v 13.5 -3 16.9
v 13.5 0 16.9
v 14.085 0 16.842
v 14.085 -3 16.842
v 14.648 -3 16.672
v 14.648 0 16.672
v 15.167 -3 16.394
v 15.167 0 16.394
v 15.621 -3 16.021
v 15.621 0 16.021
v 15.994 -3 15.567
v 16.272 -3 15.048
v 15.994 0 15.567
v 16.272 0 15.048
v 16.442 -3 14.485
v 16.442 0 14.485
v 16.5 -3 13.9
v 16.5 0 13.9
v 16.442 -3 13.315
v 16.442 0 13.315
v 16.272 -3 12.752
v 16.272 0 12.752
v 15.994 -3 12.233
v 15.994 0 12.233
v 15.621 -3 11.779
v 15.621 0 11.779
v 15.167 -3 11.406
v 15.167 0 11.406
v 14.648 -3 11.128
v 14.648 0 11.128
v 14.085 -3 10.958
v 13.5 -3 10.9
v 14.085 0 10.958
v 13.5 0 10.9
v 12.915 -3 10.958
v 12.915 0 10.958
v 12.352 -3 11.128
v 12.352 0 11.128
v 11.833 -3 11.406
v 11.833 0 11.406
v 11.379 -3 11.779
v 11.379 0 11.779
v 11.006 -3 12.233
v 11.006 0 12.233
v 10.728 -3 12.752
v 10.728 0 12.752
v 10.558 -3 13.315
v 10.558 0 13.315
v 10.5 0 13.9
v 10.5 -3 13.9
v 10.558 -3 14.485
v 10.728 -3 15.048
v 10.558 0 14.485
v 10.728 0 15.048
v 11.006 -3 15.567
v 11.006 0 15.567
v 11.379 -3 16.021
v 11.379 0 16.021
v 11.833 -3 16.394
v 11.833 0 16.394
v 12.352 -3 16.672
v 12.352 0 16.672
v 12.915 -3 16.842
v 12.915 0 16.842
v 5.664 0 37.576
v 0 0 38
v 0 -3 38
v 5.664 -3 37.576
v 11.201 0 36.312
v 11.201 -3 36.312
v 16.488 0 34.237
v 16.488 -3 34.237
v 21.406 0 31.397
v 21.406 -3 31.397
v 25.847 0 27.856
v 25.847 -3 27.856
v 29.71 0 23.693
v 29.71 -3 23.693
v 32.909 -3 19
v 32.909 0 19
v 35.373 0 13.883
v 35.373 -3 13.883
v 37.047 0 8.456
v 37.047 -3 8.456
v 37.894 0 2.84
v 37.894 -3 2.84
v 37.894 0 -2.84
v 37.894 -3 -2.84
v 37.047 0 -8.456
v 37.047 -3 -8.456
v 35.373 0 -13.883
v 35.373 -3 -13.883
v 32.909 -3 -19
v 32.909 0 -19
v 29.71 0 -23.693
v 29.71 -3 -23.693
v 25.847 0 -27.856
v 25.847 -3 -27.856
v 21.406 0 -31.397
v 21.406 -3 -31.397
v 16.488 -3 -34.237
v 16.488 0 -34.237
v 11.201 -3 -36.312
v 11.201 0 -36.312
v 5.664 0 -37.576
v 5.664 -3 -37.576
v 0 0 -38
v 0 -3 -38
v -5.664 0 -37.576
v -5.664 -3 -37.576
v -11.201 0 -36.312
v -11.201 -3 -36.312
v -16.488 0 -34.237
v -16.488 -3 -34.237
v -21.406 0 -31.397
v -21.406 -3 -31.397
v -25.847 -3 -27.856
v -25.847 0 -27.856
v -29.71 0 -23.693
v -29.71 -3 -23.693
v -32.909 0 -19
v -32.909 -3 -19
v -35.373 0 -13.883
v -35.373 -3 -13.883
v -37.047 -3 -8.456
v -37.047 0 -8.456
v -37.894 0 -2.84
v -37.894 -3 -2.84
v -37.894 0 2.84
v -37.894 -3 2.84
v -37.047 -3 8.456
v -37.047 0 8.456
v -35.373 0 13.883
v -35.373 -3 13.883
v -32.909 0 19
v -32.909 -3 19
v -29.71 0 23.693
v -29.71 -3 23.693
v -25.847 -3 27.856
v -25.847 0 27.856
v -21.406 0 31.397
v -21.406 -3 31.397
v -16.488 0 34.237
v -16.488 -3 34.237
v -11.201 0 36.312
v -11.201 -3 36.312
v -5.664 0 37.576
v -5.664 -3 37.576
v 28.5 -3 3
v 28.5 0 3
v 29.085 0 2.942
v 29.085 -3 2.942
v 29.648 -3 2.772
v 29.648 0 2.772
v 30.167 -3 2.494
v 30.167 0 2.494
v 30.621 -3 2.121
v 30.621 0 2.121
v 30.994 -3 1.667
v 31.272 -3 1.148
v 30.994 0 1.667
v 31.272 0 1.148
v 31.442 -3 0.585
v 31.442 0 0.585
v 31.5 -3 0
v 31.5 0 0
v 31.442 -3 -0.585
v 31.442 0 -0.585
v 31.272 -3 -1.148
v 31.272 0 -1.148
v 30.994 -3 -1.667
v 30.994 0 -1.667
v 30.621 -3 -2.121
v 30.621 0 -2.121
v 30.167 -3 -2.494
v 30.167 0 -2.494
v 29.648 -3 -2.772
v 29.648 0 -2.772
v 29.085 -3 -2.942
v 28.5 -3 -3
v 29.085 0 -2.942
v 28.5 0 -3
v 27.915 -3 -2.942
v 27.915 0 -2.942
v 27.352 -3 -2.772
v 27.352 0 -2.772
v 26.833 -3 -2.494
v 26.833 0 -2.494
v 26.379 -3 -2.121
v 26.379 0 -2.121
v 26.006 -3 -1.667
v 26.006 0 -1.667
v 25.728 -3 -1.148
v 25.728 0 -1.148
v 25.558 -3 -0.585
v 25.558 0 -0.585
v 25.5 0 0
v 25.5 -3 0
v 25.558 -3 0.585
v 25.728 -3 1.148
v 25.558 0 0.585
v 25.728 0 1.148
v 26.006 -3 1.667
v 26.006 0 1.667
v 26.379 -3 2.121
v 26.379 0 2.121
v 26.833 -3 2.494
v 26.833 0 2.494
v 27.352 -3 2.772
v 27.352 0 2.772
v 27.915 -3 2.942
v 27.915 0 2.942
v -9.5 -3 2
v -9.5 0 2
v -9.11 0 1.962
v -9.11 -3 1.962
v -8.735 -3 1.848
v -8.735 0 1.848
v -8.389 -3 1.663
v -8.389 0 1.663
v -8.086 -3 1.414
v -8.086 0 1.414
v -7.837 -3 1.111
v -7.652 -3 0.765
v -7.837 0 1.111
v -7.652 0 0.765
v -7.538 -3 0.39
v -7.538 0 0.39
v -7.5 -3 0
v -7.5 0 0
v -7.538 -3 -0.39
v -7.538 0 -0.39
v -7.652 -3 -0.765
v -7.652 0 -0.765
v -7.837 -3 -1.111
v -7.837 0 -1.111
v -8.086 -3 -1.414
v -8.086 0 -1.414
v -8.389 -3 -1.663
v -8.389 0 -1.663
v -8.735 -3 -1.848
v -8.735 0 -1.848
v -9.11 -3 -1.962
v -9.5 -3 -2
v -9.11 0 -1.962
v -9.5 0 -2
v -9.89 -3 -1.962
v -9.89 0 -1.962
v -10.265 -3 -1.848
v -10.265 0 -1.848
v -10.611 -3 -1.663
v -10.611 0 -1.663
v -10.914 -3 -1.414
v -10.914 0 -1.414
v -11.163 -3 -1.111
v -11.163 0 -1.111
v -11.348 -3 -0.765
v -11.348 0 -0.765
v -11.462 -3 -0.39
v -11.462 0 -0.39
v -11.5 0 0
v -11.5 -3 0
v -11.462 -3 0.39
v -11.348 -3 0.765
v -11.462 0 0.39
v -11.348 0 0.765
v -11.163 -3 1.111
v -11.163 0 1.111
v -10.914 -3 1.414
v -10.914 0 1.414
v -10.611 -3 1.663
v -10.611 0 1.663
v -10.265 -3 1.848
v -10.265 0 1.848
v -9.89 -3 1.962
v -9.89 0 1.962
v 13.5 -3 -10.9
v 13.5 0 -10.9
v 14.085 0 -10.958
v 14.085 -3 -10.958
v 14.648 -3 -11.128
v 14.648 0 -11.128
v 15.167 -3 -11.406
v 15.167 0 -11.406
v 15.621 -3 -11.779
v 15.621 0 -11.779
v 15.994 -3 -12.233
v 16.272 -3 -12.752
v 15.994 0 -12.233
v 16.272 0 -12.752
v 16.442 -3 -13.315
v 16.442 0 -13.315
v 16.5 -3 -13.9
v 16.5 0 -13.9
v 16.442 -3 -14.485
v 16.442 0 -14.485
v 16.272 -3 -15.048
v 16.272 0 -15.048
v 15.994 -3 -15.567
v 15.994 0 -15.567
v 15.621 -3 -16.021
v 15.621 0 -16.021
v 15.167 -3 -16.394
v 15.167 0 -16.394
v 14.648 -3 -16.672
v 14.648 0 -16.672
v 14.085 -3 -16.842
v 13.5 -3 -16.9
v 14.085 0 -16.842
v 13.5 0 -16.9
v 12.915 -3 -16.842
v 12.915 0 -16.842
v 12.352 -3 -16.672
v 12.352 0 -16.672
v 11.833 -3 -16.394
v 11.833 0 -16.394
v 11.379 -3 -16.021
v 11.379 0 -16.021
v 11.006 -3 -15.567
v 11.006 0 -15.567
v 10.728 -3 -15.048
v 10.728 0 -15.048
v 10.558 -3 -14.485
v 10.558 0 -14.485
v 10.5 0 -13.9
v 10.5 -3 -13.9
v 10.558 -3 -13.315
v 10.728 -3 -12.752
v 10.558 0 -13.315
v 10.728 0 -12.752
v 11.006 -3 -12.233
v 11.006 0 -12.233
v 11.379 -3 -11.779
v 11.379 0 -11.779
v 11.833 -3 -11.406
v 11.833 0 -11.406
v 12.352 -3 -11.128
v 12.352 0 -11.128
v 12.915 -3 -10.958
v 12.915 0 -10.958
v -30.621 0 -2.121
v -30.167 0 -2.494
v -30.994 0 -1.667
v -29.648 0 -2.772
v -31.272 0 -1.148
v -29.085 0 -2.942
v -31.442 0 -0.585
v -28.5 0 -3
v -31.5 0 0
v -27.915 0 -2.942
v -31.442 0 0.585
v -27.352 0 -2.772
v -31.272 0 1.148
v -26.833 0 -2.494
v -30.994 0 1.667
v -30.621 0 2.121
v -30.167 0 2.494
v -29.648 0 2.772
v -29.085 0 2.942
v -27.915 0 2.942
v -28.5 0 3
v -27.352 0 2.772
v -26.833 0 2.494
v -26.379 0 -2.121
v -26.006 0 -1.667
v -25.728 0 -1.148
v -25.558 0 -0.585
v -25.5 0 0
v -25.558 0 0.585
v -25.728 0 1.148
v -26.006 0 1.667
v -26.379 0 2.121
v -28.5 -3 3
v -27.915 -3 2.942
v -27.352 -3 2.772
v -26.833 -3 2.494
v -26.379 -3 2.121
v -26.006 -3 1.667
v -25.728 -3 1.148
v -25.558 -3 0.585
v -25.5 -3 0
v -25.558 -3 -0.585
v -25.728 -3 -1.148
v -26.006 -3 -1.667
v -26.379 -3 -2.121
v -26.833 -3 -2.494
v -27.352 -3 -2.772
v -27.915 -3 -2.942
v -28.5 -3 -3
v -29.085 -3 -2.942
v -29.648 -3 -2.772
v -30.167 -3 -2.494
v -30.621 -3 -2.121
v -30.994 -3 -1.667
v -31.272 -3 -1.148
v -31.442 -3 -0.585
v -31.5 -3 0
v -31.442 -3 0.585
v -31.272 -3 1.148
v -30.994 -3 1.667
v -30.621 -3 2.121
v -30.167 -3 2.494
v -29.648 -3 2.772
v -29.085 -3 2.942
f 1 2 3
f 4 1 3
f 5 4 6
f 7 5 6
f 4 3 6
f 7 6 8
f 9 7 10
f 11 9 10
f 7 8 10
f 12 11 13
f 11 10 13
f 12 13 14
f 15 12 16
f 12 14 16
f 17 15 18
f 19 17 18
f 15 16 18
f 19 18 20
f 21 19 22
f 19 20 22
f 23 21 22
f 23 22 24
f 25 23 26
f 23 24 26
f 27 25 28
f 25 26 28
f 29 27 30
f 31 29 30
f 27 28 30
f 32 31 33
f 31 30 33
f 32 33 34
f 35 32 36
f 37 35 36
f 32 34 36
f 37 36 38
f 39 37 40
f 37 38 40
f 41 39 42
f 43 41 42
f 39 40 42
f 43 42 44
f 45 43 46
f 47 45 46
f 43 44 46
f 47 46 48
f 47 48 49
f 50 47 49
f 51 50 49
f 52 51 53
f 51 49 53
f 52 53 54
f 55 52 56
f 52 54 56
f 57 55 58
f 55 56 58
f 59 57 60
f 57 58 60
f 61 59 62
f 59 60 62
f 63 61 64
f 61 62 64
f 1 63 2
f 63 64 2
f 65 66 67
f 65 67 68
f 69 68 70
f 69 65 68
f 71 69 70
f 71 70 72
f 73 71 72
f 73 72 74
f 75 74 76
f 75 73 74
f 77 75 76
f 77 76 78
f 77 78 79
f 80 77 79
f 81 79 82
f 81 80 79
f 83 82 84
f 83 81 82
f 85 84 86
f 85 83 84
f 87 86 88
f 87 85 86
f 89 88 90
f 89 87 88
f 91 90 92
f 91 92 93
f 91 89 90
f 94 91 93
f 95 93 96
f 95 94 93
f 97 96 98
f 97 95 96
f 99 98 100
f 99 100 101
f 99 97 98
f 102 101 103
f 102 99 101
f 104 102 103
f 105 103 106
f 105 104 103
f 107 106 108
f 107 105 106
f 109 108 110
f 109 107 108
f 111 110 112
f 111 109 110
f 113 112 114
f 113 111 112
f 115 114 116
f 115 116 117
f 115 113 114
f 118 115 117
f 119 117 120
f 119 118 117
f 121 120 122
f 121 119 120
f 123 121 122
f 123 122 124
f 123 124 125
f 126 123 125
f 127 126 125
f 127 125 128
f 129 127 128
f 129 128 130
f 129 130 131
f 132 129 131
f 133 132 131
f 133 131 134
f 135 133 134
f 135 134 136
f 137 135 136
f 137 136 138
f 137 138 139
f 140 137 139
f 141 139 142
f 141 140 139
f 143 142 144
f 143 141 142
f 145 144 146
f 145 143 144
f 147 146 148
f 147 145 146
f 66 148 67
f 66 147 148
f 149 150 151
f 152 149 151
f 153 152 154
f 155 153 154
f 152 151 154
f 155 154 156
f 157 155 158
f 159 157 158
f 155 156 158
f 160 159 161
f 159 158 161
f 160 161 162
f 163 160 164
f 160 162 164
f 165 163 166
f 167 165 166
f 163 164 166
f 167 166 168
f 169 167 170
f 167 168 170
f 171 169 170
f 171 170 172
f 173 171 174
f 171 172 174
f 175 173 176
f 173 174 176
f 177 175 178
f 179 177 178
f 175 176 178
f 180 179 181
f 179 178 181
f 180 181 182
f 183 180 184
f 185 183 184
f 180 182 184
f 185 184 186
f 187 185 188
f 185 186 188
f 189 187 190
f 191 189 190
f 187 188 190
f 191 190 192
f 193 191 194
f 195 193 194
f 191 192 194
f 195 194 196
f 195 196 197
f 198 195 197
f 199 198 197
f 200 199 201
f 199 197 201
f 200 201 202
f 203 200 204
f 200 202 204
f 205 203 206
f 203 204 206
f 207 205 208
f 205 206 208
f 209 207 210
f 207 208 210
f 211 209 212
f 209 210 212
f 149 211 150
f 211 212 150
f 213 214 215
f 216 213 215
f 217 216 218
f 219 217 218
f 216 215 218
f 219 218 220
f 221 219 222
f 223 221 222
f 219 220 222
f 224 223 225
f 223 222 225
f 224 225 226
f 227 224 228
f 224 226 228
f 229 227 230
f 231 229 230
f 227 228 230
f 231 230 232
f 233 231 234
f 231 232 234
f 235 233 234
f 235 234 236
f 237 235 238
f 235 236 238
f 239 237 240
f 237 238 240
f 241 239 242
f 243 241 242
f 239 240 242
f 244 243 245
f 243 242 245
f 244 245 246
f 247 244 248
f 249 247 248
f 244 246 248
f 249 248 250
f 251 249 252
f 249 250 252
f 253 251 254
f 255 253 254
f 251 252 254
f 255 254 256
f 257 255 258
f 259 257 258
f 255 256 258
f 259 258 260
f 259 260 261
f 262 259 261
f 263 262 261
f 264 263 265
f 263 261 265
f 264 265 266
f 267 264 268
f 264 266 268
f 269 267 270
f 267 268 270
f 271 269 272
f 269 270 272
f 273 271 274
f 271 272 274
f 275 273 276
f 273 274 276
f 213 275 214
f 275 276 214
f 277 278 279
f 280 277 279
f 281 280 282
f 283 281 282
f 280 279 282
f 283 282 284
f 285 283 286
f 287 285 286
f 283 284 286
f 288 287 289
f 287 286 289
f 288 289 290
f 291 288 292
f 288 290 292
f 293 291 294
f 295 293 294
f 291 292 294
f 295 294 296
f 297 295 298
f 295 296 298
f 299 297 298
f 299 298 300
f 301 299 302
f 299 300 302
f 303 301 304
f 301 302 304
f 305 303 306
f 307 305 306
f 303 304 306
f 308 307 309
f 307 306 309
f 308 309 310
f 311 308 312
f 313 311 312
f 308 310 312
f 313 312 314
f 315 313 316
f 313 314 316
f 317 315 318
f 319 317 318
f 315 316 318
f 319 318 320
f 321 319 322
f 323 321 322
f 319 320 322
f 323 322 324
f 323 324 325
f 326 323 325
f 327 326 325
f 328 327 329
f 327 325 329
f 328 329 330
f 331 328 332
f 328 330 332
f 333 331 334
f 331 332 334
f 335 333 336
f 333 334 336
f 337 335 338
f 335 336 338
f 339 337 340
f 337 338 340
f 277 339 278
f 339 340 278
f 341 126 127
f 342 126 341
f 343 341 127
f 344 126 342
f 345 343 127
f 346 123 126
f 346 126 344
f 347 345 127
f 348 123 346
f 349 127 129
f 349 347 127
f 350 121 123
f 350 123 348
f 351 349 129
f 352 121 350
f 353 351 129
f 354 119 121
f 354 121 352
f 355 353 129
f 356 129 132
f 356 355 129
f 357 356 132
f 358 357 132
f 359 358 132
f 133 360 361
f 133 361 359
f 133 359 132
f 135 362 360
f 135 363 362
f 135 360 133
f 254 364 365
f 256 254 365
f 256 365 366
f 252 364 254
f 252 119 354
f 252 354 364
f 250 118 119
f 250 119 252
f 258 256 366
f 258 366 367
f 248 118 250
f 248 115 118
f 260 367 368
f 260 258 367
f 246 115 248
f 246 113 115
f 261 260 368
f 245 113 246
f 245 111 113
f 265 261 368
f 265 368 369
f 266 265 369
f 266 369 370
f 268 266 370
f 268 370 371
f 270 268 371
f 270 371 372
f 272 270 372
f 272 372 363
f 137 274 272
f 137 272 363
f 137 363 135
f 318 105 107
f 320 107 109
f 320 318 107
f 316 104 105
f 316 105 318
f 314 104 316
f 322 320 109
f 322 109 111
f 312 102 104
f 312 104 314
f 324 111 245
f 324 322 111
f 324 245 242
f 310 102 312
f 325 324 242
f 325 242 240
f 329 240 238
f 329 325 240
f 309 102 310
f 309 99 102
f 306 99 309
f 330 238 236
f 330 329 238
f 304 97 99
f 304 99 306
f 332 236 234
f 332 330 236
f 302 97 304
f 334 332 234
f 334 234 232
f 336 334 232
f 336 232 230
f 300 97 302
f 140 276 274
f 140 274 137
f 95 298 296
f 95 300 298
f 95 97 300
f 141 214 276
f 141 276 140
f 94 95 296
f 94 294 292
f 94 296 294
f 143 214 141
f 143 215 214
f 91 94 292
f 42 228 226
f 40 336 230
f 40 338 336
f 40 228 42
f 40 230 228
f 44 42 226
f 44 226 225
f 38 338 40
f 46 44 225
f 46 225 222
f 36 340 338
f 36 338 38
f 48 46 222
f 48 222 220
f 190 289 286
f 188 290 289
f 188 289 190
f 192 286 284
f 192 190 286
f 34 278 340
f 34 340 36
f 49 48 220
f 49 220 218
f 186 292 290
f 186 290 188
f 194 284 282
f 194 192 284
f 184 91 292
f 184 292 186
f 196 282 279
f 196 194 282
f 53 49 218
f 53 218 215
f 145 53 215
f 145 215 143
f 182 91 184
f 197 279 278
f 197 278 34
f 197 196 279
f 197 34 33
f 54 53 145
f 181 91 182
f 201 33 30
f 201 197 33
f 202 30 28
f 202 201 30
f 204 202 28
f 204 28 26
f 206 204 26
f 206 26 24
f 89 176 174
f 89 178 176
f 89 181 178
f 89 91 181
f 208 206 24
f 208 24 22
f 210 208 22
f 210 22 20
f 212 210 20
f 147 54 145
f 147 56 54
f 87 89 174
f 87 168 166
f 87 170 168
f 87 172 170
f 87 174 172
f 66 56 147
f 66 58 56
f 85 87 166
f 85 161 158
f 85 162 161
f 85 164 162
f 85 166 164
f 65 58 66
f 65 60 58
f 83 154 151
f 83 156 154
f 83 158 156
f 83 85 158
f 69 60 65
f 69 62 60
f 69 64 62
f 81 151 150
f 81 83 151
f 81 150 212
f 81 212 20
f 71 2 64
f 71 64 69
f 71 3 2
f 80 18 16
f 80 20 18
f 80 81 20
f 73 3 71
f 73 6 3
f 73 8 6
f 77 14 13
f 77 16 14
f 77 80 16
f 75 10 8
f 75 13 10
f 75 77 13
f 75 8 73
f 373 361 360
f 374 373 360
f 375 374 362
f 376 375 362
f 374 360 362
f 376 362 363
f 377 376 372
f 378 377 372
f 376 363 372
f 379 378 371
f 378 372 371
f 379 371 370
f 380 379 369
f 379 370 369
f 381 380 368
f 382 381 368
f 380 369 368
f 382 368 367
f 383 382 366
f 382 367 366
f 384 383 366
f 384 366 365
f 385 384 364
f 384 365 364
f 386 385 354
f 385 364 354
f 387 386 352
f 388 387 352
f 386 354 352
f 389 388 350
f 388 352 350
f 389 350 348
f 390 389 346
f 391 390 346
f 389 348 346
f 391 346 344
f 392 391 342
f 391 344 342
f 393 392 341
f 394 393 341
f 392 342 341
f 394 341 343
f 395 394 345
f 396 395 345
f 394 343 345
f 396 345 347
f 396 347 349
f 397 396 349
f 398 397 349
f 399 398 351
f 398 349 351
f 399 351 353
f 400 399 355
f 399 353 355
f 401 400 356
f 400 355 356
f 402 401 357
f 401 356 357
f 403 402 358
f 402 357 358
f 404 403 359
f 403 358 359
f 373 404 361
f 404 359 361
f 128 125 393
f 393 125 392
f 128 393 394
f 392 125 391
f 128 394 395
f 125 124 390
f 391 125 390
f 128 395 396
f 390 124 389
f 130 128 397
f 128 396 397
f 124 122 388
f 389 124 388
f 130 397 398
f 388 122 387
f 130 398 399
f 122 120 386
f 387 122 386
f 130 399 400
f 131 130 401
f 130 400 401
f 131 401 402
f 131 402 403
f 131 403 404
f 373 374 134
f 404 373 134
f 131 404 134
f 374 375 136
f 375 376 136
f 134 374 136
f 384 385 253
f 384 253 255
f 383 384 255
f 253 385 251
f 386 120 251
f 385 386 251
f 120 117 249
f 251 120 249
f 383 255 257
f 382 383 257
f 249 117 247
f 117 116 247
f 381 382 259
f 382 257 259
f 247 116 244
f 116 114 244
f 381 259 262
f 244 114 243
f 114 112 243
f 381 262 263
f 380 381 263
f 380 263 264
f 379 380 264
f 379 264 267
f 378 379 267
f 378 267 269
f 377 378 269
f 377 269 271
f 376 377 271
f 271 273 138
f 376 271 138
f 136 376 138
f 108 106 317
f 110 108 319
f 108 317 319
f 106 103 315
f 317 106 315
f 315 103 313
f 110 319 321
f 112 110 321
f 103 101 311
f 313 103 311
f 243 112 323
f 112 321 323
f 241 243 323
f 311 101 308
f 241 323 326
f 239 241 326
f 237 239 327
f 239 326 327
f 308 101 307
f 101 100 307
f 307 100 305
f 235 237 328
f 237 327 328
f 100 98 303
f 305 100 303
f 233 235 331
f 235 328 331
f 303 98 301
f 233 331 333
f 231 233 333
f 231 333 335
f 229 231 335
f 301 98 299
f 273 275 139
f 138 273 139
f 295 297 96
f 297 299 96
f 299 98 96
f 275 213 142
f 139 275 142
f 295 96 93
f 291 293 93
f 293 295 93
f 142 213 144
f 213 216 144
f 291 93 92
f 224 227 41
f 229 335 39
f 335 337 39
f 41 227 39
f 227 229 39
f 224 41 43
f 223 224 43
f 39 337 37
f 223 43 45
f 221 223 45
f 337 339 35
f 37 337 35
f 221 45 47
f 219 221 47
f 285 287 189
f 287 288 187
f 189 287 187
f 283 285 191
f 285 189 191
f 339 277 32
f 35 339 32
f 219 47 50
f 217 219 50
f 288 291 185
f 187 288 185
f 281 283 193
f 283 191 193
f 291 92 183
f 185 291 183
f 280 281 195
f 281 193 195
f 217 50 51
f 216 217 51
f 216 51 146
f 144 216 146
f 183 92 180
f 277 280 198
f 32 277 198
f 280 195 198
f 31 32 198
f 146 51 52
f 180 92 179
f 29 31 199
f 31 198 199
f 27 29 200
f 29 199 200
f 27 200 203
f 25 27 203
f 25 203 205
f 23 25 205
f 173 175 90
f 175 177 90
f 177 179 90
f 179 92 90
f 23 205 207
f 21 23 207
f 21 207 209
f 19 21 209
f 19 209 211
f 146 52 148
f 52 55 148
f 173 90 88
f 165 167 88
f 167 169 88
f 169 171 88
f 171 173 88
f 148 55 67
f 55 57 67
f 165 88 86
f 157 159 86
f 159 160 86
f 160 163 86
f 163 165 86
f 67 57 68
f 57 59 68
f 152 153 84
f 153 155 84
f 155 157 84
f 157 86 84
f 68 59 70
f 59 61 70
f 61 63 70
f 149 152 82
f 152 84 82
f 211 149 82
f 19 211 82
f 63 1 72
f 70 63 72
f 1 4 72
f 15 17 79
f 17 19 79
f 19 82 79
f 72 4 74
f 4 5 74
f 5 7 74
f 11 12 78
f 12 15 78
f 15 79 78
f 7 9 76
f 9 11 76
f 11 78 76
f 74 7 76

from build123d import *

# Parameters (mm, degrees)
SKETCH1_R           = 38
SKETCH1_R_2         = 3
SKETCH1_R_3         = 2
BOSS_EXTRUDE1_DEPTH = 3


with BuildPart() as part:
    # Sketch1 → Boss-Extrude1 (new body)
    with BuildSketch(Plane(origin=(0, 0, 0), x_dir=(1, 0, 0), z_dir=(0, 1, 0))):
        with Locations(Location((0, 0, 0), (0, 0, 270))):
            Circle(SKETCH1_R)
        with Locations(Location((28.5, 0, 0), (0, 0, 270))):
            Circle(SKETCH1_R_2, mode=Mode.SUBTRACT)
        with Locations(Location((-28.5, 0, 0), (0, 0, 270))):
            Circle(SKETCH1_R_2, mode=Mode.SUBTRACT)
        with Locations(Location((13.5, 13.9, 0), (0, 0, 270))):
            Circle(SKETCH1_R_2, mode=Mode.SUBTRACT)
        with Locations(Location((13.5, -13.9, 0), (0, 0, 270))):
            Circle(SKETCH1_R_2, mode=Mode.SUBTRACT)
        with Locations(Location((-9.5, 0, 0), (0, 0, 270))):
            Circle(SKETCH1_R_3, mode=Mode.SUBTRACT)
    extrude(amount=-BOSS_EXTRUDE1_DEPTH)


solid = part.part
